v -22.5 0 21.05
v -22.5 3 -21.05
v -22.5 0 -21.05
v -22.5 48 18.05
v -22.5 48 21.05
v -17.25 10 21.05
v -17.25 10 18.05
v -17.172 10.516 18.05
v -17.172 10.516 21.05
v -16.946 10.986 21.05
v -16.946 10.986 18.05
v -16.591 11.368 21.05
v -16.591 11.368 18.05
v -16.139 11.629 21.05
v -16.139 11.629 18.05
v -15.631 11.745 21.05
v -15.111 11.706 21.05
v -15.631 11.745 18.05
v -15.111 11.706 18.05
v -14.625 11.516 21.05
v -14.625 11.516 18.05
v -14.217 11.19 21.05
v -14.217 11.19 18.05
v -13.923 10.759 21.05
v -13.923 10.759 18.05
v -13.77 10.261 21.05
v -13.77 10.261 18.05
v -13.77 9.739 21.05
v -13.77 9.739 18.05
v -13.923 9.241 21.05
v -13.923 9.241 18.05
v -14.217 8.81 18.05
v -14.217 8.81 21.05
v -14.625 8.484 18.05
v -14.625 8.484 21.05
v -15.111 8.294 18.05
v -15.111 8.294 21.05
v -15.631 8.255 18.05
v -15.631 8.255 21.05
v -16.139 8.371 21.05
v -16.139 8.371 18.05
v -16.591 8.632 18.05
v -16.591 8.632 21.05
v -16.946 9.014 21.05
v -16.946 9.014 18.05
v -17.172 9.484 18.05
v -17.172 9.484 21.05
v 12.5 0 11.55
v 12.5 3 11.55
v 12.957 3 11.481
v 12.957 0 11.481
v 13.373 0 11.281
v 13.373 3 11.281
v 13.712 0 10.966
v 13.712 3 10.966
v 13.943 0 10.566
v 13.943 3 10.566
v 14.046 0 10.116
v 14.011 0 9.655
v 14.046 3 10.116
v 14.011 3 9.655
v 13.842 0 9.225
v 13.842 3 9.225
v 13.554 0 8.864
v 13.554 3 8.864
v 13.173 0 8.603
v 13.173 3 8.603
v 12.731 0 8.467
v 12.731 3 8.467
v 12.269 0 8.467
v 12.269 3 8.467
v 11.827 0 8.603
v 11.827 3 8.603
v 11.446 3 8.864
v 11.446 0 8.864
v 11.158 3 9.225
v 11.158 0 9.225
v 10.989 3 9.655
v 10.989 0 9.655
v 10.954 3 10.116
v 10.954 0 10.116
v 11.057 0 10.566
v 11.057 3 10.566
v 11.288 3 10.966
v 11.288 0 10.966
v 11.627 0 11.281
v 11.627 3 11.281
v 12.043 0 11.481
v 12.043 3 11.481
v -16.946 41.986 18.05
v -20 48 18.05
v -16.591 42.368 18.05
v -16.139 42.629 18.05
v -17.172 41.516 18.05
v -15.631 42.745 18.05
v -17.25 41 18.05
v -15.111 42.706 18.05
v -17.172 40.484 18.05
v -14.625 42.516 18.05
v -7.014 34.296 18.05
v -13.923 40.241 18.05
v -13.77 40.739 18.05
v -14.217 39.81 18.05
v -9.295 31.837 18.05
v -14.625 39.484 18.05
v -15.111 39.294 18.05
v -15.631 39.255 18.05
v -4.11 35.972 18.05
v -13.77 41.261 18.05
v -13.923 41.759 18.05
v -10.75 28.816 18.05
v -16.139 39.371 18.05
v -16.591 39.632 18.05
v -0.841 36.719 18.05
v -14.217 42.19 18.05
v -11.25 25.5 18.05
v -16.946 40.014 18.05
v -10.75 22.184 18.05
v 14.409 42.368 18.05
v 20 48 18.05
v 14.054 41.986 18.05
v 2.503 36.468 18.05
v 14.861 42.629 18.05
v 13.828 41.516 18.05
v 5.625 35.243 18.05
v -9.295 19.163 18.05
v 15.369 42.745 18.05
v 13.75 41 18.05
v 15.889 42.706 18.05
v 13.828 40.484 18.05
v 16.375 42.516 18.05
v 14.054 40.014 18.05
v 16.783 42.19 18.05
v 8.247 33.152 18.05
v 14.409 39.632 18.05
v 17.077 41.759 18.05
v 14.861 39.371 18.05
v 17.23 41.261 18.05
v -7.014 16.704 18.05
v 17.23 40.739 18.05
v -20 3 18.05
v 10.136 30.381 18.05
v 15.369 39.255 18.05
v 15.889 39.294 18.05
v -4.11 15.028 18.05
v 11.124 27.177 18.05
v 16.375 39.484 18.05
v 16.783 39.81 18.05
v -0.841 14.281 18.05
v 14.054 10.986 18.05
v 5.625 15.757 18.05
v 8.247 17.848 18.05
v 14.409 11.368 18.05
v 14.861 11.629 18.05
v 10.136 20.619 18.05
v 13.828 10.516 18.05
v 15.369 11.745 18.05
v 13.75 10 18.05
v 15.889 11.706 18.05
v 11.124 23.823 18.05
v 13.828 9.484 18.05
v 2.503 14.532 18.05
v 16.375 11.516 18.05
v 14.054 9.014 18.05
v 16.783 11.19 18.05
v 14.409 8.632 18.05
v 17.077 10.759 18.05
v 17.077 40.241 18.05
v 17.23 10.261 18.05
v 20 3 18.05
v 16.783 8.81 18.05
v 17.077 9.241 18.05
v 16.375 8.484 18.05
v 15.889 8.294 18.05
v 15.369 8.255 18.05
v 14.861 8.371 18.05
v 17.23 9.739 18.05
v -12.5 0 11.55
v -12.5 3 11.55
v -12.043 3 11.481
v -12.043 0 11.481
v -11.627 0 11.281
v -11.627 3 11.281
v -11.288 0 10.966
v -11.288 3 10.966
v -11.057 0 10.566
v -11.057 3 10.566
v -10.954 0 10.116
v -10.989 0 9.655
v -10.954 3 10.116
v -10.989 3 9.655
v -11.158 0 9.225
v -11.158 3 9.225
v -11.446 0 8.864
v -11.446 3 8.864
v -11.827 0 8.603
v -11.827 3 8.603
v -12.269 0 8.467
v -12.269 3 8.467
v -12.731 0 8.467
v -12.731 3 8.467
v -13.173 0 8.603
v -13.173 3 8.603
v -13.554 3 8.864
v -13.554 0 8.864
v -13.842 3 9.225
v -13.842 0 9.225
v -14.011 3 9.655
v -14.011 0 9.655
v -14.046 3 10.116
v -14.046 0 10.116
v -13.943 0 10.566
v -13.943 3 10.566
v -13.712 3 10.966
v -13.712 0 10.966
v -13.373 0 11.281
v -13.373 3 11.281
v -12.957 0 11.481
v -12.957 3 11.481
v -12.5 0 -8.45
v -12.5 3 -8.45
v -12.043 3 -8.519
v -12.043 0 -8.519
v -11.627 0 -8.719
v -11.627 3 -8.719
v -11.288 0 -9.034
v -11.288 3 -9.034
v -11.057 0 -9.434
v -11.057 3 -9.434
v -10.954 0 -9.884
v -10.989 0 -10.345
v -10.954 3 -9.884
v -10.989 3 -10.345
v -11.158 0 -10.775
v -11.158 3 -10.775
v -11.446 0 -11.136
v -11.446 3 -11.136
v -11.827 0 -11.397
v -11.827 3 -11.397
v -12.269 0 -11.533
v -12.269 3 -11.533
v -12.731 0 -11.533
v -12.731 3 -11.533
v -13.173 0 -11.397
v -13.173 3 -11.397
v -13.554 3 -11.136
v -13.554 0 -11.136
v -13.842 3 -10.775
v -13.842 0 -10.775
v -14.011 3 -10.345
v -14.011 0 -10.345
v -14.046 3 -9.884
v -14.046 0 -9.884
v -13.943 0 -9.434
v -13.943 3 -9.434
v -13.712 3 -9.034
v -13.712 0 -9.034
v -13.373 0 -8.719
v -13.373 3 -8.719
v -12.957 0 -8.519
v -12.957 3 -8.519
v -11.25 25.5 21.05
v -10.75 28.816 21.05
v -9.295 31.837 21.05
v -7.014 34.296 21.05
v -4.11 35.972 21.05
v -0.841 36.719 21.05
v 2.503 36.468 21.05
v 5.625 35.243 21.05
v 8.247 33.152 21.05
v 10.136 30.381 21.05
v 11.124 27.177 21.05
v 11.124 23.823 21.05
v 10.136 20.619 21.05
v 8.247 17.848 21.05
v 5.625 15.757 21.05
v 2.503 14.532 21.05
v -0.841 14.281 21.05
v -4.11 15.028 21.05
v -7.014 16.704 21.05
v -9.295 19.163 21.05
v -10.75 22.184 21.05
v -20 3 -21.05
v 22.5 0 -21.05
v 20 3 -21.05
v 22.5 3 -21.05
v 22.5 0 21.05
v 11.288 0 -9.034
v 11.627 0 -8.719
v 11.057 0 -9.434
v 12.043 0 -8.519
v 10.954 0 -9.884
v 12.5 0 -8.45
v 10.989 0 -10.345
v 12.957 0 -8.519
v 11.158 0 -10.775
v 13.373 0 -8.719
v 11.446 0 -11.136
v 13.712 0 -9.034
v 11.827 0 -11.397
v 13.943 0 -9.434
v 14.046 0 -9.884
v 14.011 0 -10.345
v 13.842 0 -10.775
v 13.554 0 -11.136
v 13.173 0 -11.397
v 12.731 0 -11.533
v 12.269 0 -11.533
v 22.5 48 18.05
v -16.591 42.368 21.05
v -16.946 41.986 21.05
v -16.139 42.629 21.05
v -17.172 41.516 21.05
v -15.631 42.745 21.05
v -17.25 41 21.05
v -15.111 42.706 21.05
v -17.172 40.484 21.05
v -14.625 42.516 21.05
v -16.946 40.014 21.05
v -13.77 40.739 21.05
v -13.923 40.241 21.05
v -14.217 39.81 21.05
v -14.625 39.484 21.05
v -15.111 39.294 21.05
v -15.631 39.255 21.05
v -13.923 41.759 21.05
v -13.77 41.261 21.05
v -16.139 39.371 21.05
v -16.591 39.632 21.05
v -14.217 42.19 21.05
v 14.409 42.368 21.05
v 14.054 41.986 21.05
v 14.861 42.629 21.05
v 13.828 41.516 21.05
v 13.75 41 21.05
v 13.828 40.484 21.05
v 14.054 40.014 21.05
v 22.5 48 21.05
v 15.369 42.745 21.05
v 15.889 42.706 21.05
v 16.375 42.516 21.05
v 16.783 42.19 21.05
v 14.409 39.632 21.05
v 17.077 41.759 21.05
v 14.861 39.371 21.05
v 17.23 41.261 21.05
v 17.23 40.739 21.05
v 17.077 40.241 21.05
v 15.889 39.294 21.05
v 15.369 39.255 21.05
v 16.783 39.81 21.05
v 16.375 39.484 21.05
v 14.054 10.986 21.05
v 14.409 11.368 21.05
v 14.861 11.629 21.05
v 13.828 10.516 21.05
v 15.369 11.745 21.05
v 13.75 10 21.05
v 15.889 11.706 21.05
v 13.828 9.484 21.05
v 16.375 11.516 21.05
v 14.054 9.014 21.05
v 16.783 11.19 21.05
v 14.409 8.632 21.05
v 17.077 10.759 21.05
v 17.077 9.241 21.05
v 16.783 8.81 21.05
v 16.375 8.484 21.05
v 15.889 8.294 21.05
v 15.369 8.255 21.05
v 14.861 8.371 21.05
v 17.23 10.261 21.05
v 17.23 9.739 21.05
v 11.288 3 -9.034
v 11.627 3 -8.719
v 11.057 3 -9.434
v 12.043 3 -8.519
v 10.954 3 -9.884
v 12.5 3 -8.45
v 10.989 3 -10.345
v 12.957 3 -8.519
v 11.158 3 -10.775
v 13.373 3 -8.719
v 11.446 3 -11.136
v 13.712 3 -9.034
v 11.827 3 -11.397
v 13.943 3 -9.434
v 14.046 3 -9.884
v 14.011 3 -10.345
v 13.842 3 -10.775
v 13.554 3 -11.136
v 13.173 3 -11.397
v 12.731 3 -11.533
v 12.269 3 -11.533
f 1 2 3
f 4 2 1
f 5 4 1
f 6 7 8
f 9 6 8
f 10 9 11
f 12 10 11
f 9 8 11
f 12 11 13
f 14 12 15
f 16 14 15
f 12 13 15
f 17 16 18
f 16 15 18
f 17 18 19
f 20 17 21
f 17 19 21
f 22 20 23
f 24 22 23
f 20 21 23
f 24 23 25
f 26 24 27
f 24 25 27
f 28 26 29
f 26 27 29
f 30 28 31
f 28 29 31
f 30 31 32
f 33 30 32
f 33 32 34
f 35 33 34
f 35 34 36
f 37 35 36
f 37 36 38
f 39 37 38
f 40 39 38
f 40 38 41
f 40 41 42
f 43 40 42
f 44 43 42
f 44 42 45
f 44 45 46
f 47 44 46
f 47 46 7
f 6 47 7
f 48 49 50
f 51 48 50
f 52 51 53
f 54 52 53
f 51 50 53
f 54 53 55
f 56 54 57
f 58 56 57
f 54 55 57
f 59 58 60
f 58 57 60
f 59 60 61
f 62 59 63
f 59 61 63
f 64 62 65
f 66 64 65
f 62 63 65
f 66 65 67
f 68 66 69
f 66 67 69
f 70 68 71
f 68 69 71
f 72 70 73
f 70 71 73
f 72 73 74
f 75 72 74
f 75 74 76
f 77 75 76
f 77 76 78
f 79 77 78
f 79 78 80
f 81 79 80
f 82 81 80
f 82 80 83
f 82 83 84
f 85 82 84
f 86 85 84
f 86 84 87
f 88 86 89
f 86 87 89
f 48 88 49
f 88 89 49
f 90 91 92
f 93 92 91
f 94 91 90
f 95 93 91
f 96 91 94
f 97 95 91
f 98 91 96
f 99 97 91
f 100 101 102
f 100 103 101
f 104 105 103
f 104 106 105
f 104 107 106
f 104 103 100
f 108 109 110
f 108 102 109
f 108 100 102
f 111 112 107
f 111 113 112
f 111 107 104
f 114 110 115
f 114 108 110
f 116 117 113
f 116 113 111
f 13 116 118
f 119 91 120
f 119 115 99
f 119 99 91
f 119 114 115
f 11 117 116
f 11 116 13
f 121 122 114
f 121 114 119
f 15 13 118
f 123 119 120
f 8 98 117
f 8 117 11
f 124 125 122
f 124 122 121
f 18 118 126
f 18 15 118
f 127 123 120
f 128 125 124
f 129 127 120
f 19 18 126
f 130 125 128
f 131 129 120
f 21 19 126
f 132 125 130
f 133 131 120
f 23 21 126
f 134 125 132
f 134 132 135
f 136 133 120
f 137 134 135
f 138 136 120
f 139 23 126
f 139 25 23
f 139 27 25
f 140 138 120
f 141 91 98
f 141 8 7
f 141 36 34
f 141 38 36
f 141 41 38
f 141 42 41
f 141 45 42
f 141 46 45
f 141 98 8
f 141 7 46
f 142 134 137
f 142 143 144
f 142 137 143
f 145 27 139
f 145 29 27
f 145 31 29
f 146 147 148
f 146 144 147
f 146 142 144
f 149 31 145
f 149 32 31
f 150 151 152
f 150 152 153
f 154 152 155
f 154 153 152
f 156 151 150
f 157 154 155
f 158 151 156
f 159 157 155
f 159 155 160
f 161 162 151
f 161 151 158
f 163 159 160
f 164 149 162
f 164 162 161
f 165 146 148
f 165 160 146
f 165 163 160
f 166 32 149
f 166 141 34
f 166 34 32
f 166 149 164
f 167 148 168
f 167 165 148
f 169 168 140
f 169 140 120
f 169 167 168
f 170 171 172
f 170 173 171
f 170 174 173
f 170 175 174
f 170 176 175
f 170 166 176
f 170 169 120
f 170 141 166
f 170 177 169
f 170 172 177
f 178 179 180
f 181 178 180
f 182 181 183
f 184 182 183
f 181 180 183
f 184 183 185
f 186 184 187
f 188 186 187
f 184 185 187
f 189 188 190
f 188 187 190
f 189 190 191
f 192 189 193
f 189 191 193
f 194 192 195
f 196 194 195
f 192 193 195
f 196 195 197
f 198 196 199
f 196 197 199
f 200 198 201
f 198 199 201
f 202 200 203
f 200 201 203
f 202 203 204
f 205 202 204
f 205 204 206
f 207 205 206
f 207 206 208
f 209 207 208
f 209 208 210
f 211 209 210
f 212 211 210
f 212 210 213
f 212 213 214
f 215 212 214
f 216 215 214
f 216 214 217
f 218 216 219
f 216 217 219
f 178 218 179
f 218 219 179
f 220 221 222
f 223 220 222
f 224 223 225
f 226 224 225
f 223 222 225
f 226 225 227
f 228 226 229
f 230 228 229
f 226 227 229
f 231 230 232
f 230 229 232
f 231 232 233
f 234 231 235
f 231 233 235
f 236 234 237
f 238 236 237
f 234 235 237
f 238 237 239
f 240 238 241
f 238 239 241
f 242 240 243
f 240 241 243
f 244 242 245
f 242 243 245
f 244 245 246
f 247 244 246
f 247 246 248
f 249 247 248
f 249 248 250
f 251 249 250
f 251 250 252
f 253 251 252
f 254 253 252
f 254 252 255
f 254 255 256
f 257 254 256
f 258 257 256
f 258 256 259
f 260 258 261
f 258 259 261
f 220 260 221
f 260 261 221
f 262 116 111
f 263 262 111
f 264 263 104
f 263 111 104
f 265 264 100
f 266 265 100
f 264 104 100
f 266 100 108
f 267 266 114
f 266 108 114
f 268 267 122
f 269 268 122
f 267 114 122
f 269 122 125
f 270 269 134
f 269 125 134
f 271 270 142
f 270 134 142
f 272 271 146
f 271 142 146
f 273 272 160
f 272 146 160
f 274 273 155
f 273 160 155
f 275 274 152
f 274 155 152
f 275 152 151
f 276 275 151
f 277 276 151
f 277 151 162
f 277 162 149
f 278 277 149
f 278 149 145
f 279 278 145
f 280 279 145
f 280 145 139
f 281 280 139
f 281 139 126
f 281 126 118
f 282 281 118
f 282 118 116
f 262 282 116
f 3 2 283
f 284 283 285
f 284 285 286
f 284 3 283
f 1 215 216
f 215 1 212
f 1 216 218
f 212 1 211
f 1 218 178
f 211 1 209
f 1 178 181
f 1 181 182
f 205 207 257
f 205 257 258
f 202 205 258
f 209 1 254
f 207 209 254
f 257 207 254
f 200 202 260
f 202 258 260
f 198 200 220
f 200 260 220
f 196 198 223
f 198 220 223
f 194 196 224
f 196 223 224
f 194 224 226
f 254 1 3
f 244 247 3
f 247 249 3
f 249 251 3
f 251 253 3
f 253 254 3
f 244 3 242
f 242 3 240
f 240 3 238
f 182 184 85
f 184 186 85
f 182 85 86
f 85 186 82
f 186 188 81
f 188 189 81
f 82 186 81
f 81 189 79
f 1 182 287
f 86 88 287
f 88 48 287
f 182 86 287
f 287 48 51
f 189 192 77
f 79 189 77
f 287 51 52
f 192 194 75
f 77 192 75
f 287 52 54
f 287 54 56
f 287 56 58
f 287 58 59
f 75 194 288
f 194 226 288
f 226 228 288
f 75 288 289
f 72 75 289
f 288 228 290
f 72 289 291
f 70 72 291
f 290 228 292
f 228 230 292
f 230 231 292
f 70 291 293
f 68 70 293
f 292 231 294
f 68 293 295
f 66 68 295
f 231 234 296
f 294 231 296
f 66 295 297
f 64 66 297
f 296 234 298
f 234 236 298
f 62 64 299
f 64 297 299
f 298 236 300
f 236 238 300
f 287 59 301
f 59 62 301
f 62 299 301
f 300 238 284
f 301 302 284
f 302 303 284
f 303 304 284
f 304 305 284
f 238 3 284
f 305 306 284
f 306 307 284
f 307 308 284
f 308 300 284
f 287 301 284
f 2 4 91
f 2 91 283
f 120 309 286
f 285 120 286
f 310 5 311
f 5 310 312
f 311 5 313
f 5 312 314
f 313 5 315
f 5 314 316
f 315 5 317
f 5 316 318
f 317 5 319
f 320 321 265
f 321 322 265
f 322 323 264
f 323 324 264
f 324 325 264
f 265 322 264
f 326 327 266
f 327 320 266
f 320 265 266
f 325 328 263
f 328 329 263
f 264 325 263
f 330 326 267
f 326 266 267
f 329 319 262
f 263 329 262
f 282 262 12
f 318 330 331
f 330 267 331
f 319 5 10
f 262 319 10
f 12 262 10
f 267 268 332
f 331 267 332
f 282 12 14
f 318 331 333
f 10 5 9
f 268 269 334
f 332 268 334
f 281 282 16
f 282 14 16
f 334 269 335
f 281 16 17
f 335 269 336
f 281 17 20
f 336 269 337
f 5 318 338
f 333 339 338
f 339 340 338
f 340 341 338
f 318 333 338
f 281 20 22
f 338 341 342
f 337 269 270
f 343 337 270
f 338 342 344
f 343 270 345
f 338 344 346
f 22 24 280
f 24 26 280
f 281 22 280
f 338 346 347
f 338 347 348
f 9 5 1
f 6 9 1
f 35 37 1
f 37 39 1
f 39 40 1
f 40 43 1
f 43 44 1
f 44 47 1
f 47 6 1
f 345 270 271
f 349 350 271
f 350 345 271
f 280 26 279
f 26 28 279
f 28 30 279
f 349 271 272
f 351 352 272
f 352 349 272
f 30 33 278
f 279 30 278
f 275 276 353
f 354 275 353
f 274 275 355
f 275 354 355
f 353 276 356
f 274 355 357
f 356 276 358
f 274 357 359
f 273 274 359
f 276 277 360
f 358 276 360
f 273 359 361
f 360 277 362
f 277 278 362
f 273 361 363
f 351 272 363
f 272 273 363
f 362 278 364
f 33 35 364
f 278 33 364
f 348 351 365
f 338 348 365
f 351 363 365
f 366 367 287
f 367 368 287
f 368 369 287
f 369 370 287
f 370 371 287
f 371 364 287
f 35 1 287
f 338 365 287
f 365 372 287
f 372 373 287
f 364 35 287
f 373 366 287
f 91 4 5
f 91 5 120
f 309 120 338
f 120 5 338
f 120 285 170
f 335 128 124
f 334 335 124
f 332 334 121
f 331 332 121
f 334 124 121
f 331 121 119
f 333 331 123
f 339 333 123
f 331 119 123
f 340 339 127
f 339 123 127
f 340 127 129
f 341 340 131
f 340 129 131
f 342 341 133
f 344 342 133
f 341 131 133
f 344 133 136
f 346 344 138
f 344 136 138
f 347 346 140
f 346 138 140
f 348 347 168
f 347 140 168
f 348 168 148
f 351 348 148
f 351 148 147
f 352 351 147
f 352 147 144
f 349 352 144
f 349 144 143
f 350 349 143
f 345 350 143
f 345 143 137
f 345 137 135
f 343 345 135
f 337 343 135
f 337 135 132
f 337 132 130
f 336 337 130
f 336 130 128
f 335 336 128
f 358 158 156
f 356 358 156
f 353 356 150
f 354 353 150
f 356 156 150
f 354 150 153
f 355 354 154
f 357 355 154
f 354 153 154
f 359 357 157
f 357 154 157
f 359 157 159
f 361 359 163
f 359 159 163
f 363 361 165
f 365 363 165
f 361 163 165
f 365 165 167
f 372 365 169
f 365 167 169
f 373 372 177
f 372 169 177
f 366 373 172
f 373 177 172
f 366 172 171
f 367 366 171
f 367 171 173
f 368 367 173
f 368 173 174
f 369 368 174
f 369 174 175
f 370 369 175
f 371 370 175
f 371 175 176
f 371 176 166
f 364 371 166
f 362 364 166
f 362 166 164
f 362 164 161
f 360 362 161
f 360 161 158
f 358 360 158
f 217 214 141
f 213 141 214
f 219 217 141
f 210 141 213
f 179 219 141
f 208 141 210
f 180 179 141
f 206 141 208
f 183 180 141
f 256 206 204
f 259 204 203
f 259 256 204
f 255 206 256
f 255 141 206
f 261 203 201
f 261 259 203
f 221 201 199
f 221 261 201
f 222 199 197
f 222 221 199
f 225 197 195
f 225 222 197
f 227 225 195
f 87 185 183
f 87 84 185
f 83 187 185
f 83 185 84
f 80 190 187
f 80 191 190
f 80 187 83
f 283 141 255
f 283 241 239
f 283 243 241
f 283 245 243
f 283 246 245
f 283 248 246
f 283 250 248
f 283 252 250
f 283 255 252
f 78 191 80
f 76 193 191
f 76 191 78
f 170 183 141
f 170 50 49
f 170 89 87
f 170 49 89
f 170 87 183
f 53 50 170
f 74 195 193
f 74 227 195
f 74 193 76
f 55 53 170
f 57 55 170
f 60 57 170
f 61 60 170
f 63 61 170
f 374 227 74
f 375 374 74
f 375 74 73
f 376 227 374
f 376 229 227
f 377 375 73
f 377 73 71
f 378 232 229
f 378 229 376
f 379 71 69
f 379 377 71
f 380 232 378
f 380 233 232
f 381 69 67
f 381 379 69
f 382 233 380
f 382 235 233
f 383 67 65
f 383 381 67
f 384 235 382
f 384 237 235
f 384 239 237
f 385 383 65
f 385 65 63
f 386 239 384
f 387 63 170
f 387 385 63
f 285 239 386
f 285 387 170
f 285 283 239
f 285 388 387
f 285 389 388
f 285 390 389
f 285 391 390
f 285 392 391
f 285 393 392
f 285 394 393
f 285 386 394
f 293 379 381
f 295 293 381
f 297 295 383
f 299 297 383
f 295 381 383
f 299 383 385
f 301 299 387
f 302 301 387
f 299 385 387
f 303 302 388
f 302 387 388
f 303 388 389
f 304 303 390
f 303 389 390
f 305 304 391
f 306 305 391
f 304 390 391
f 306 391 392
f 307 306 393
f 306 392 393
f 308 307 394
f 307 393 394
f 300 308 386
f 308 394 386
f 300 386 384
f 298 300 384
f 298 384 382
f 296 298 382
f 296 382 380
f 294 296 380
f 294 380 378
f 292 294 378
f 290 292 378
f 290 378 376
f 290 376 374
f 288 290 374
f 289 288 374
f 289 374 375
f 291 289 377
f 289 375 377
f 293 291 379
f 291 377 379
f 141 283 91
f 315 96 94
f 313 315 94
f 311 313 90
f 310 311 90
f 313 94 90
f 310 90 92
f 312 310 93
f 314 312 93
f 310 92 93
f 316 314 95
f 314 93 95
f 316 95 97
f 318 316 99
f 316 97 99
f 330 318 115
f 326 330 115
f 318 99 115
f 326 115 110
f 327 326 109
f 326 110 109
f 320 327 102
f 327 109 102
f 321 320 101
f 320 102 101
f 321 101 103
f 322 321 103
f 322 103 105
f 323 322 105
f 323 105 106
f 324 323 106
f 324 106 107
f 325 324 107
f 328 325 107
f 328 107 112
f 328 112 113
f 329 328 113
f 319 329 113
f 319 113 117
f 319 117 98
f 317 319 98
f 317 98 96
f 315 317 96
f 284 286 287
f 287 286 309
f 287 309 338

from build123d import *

# Parameters (mm, degrees)
SKETCH1_W           = 45
SKETCH1_H           = 42.1
BOSS_EXTRUDE1_DEPTH = 3
SKETCH2_W           = 45
SKETCH2_H           = 3
BOSS_EXTRUDE2_DEPTH = 45
SKETCH4_R           = 11.25
CUT_EXTRUDE1_DEPTH  = 66.871541655
SKETCH5_R           = 1.75
CUT_EXTRUDE2_DEPTH  = 66.871541655
SKETCH6_R           = 1.55
CUT_EXTRUDE3_DEPTH  = 3
BOSS_EXTRUDE3_DEPTH = 2.5


with BuildPart() as part:
    # Sketch1 → Boss-Extrude1 (new body)
    with BuildSketch(Plane(origin=(0, 0, 0), x_dir=(1, 0, 0), z_dir=(0, 1, 0))):
        Rectangle(SKETCH1_W, SKETCH1_H)
    extrude(amount=BOSS_EXTRUDE1_DEPTH)

    # Sketch2 → Boss-Extrude2 (add)
    with BuildSketch(Plane.XZ.offset(-3)):
        with Locations((0, 19.55)):
            Rectangle(SKETCH2_W, SKETCH2_H)
    extrude(amount=-BOSS_EXTRUDE2_DEPTH)

    # Sketch4 → Cut-Extrude1 (cut, through all)
    with BuildSketch(Plane(origin=(0, 0, 18.05), x_dir=(-1, 0, 0), z_dir=(0, 0, -1))):
        with Locations((0, 25.5)):
            Circle(SKETCH4_R)
    extrude(amount=-CUT_EXTRUDE1_DEPTH, mode=Mode.SUBTRACT)

    # Sketch5 → Cut-Extrude2 (cut, through all)
    with BuildSketch(Plane(origin=(0, 0, 18.05), x_dir=(-1, 0, 0), z_dir=(0, 0, -1))):
        with Locations((-15.5, 41)):
            Circle(SKETCH5_R)
        with Locations((15.5, 41)):
            Circle(SKETCH5_R)
        with Locations((15.5, 10)):
            Circle(SKETCH5_R)
        with Locations((-15.5, 10)):
            Circle(SKETCH5_R)
    extrude(amount=-CUT_EXTRUDE2_DEPTH, mode=Mode.SUBTRACT)

    # Sketch6 → Cut-Extrude3 (cut)
    with BuildSketch(Plane(origin=(0, 3, 0), x_dir=(1, 0, 0), z_dir=(0, 1, 0))):
        with Locations(Location((12.5, -10, 0), (0, 0, 270))):
            Circle(SKETCH6_R)
        with Locations(Location((-12.5, -10, 0), (0, 0, 270))):
            Circle(SKETCH6_R)
        with Locations(Location((-12.5, 10, 0), (0, 0, 270))):
            Circle(SKETCH6_R)
        with Locations(Location((12.5, 10, 0), (0, 0, 270))):
            Circle(SKETCH6_R)
    extrude(amount=-CUT_EXTRUDE3_DEPTH, mode=Mode.SUBTRACT)

    # Sketch8 → Boss-Extrude3 (add)
    with BuildSketch(Plane(origin=(22.5, 0, 0), x_dir=(0, 0, -1), z_dir=(1, 0, 0))):
        Polygon((-18.05, 48), (21.05, 3), (-18.05, 3), align=None)
    boss_extrude3 = extrude(amount=-BOSS_EXTRUDE3_DEPTH)

    # Mirror1: Boss-Extrude3 across plane
    add(boss_extrude3.mirror(Plane(origin=(0, 0, 0), x_dir=(0, 0, 1), z_dir=(1, 0, 0))))


solid = part.part
